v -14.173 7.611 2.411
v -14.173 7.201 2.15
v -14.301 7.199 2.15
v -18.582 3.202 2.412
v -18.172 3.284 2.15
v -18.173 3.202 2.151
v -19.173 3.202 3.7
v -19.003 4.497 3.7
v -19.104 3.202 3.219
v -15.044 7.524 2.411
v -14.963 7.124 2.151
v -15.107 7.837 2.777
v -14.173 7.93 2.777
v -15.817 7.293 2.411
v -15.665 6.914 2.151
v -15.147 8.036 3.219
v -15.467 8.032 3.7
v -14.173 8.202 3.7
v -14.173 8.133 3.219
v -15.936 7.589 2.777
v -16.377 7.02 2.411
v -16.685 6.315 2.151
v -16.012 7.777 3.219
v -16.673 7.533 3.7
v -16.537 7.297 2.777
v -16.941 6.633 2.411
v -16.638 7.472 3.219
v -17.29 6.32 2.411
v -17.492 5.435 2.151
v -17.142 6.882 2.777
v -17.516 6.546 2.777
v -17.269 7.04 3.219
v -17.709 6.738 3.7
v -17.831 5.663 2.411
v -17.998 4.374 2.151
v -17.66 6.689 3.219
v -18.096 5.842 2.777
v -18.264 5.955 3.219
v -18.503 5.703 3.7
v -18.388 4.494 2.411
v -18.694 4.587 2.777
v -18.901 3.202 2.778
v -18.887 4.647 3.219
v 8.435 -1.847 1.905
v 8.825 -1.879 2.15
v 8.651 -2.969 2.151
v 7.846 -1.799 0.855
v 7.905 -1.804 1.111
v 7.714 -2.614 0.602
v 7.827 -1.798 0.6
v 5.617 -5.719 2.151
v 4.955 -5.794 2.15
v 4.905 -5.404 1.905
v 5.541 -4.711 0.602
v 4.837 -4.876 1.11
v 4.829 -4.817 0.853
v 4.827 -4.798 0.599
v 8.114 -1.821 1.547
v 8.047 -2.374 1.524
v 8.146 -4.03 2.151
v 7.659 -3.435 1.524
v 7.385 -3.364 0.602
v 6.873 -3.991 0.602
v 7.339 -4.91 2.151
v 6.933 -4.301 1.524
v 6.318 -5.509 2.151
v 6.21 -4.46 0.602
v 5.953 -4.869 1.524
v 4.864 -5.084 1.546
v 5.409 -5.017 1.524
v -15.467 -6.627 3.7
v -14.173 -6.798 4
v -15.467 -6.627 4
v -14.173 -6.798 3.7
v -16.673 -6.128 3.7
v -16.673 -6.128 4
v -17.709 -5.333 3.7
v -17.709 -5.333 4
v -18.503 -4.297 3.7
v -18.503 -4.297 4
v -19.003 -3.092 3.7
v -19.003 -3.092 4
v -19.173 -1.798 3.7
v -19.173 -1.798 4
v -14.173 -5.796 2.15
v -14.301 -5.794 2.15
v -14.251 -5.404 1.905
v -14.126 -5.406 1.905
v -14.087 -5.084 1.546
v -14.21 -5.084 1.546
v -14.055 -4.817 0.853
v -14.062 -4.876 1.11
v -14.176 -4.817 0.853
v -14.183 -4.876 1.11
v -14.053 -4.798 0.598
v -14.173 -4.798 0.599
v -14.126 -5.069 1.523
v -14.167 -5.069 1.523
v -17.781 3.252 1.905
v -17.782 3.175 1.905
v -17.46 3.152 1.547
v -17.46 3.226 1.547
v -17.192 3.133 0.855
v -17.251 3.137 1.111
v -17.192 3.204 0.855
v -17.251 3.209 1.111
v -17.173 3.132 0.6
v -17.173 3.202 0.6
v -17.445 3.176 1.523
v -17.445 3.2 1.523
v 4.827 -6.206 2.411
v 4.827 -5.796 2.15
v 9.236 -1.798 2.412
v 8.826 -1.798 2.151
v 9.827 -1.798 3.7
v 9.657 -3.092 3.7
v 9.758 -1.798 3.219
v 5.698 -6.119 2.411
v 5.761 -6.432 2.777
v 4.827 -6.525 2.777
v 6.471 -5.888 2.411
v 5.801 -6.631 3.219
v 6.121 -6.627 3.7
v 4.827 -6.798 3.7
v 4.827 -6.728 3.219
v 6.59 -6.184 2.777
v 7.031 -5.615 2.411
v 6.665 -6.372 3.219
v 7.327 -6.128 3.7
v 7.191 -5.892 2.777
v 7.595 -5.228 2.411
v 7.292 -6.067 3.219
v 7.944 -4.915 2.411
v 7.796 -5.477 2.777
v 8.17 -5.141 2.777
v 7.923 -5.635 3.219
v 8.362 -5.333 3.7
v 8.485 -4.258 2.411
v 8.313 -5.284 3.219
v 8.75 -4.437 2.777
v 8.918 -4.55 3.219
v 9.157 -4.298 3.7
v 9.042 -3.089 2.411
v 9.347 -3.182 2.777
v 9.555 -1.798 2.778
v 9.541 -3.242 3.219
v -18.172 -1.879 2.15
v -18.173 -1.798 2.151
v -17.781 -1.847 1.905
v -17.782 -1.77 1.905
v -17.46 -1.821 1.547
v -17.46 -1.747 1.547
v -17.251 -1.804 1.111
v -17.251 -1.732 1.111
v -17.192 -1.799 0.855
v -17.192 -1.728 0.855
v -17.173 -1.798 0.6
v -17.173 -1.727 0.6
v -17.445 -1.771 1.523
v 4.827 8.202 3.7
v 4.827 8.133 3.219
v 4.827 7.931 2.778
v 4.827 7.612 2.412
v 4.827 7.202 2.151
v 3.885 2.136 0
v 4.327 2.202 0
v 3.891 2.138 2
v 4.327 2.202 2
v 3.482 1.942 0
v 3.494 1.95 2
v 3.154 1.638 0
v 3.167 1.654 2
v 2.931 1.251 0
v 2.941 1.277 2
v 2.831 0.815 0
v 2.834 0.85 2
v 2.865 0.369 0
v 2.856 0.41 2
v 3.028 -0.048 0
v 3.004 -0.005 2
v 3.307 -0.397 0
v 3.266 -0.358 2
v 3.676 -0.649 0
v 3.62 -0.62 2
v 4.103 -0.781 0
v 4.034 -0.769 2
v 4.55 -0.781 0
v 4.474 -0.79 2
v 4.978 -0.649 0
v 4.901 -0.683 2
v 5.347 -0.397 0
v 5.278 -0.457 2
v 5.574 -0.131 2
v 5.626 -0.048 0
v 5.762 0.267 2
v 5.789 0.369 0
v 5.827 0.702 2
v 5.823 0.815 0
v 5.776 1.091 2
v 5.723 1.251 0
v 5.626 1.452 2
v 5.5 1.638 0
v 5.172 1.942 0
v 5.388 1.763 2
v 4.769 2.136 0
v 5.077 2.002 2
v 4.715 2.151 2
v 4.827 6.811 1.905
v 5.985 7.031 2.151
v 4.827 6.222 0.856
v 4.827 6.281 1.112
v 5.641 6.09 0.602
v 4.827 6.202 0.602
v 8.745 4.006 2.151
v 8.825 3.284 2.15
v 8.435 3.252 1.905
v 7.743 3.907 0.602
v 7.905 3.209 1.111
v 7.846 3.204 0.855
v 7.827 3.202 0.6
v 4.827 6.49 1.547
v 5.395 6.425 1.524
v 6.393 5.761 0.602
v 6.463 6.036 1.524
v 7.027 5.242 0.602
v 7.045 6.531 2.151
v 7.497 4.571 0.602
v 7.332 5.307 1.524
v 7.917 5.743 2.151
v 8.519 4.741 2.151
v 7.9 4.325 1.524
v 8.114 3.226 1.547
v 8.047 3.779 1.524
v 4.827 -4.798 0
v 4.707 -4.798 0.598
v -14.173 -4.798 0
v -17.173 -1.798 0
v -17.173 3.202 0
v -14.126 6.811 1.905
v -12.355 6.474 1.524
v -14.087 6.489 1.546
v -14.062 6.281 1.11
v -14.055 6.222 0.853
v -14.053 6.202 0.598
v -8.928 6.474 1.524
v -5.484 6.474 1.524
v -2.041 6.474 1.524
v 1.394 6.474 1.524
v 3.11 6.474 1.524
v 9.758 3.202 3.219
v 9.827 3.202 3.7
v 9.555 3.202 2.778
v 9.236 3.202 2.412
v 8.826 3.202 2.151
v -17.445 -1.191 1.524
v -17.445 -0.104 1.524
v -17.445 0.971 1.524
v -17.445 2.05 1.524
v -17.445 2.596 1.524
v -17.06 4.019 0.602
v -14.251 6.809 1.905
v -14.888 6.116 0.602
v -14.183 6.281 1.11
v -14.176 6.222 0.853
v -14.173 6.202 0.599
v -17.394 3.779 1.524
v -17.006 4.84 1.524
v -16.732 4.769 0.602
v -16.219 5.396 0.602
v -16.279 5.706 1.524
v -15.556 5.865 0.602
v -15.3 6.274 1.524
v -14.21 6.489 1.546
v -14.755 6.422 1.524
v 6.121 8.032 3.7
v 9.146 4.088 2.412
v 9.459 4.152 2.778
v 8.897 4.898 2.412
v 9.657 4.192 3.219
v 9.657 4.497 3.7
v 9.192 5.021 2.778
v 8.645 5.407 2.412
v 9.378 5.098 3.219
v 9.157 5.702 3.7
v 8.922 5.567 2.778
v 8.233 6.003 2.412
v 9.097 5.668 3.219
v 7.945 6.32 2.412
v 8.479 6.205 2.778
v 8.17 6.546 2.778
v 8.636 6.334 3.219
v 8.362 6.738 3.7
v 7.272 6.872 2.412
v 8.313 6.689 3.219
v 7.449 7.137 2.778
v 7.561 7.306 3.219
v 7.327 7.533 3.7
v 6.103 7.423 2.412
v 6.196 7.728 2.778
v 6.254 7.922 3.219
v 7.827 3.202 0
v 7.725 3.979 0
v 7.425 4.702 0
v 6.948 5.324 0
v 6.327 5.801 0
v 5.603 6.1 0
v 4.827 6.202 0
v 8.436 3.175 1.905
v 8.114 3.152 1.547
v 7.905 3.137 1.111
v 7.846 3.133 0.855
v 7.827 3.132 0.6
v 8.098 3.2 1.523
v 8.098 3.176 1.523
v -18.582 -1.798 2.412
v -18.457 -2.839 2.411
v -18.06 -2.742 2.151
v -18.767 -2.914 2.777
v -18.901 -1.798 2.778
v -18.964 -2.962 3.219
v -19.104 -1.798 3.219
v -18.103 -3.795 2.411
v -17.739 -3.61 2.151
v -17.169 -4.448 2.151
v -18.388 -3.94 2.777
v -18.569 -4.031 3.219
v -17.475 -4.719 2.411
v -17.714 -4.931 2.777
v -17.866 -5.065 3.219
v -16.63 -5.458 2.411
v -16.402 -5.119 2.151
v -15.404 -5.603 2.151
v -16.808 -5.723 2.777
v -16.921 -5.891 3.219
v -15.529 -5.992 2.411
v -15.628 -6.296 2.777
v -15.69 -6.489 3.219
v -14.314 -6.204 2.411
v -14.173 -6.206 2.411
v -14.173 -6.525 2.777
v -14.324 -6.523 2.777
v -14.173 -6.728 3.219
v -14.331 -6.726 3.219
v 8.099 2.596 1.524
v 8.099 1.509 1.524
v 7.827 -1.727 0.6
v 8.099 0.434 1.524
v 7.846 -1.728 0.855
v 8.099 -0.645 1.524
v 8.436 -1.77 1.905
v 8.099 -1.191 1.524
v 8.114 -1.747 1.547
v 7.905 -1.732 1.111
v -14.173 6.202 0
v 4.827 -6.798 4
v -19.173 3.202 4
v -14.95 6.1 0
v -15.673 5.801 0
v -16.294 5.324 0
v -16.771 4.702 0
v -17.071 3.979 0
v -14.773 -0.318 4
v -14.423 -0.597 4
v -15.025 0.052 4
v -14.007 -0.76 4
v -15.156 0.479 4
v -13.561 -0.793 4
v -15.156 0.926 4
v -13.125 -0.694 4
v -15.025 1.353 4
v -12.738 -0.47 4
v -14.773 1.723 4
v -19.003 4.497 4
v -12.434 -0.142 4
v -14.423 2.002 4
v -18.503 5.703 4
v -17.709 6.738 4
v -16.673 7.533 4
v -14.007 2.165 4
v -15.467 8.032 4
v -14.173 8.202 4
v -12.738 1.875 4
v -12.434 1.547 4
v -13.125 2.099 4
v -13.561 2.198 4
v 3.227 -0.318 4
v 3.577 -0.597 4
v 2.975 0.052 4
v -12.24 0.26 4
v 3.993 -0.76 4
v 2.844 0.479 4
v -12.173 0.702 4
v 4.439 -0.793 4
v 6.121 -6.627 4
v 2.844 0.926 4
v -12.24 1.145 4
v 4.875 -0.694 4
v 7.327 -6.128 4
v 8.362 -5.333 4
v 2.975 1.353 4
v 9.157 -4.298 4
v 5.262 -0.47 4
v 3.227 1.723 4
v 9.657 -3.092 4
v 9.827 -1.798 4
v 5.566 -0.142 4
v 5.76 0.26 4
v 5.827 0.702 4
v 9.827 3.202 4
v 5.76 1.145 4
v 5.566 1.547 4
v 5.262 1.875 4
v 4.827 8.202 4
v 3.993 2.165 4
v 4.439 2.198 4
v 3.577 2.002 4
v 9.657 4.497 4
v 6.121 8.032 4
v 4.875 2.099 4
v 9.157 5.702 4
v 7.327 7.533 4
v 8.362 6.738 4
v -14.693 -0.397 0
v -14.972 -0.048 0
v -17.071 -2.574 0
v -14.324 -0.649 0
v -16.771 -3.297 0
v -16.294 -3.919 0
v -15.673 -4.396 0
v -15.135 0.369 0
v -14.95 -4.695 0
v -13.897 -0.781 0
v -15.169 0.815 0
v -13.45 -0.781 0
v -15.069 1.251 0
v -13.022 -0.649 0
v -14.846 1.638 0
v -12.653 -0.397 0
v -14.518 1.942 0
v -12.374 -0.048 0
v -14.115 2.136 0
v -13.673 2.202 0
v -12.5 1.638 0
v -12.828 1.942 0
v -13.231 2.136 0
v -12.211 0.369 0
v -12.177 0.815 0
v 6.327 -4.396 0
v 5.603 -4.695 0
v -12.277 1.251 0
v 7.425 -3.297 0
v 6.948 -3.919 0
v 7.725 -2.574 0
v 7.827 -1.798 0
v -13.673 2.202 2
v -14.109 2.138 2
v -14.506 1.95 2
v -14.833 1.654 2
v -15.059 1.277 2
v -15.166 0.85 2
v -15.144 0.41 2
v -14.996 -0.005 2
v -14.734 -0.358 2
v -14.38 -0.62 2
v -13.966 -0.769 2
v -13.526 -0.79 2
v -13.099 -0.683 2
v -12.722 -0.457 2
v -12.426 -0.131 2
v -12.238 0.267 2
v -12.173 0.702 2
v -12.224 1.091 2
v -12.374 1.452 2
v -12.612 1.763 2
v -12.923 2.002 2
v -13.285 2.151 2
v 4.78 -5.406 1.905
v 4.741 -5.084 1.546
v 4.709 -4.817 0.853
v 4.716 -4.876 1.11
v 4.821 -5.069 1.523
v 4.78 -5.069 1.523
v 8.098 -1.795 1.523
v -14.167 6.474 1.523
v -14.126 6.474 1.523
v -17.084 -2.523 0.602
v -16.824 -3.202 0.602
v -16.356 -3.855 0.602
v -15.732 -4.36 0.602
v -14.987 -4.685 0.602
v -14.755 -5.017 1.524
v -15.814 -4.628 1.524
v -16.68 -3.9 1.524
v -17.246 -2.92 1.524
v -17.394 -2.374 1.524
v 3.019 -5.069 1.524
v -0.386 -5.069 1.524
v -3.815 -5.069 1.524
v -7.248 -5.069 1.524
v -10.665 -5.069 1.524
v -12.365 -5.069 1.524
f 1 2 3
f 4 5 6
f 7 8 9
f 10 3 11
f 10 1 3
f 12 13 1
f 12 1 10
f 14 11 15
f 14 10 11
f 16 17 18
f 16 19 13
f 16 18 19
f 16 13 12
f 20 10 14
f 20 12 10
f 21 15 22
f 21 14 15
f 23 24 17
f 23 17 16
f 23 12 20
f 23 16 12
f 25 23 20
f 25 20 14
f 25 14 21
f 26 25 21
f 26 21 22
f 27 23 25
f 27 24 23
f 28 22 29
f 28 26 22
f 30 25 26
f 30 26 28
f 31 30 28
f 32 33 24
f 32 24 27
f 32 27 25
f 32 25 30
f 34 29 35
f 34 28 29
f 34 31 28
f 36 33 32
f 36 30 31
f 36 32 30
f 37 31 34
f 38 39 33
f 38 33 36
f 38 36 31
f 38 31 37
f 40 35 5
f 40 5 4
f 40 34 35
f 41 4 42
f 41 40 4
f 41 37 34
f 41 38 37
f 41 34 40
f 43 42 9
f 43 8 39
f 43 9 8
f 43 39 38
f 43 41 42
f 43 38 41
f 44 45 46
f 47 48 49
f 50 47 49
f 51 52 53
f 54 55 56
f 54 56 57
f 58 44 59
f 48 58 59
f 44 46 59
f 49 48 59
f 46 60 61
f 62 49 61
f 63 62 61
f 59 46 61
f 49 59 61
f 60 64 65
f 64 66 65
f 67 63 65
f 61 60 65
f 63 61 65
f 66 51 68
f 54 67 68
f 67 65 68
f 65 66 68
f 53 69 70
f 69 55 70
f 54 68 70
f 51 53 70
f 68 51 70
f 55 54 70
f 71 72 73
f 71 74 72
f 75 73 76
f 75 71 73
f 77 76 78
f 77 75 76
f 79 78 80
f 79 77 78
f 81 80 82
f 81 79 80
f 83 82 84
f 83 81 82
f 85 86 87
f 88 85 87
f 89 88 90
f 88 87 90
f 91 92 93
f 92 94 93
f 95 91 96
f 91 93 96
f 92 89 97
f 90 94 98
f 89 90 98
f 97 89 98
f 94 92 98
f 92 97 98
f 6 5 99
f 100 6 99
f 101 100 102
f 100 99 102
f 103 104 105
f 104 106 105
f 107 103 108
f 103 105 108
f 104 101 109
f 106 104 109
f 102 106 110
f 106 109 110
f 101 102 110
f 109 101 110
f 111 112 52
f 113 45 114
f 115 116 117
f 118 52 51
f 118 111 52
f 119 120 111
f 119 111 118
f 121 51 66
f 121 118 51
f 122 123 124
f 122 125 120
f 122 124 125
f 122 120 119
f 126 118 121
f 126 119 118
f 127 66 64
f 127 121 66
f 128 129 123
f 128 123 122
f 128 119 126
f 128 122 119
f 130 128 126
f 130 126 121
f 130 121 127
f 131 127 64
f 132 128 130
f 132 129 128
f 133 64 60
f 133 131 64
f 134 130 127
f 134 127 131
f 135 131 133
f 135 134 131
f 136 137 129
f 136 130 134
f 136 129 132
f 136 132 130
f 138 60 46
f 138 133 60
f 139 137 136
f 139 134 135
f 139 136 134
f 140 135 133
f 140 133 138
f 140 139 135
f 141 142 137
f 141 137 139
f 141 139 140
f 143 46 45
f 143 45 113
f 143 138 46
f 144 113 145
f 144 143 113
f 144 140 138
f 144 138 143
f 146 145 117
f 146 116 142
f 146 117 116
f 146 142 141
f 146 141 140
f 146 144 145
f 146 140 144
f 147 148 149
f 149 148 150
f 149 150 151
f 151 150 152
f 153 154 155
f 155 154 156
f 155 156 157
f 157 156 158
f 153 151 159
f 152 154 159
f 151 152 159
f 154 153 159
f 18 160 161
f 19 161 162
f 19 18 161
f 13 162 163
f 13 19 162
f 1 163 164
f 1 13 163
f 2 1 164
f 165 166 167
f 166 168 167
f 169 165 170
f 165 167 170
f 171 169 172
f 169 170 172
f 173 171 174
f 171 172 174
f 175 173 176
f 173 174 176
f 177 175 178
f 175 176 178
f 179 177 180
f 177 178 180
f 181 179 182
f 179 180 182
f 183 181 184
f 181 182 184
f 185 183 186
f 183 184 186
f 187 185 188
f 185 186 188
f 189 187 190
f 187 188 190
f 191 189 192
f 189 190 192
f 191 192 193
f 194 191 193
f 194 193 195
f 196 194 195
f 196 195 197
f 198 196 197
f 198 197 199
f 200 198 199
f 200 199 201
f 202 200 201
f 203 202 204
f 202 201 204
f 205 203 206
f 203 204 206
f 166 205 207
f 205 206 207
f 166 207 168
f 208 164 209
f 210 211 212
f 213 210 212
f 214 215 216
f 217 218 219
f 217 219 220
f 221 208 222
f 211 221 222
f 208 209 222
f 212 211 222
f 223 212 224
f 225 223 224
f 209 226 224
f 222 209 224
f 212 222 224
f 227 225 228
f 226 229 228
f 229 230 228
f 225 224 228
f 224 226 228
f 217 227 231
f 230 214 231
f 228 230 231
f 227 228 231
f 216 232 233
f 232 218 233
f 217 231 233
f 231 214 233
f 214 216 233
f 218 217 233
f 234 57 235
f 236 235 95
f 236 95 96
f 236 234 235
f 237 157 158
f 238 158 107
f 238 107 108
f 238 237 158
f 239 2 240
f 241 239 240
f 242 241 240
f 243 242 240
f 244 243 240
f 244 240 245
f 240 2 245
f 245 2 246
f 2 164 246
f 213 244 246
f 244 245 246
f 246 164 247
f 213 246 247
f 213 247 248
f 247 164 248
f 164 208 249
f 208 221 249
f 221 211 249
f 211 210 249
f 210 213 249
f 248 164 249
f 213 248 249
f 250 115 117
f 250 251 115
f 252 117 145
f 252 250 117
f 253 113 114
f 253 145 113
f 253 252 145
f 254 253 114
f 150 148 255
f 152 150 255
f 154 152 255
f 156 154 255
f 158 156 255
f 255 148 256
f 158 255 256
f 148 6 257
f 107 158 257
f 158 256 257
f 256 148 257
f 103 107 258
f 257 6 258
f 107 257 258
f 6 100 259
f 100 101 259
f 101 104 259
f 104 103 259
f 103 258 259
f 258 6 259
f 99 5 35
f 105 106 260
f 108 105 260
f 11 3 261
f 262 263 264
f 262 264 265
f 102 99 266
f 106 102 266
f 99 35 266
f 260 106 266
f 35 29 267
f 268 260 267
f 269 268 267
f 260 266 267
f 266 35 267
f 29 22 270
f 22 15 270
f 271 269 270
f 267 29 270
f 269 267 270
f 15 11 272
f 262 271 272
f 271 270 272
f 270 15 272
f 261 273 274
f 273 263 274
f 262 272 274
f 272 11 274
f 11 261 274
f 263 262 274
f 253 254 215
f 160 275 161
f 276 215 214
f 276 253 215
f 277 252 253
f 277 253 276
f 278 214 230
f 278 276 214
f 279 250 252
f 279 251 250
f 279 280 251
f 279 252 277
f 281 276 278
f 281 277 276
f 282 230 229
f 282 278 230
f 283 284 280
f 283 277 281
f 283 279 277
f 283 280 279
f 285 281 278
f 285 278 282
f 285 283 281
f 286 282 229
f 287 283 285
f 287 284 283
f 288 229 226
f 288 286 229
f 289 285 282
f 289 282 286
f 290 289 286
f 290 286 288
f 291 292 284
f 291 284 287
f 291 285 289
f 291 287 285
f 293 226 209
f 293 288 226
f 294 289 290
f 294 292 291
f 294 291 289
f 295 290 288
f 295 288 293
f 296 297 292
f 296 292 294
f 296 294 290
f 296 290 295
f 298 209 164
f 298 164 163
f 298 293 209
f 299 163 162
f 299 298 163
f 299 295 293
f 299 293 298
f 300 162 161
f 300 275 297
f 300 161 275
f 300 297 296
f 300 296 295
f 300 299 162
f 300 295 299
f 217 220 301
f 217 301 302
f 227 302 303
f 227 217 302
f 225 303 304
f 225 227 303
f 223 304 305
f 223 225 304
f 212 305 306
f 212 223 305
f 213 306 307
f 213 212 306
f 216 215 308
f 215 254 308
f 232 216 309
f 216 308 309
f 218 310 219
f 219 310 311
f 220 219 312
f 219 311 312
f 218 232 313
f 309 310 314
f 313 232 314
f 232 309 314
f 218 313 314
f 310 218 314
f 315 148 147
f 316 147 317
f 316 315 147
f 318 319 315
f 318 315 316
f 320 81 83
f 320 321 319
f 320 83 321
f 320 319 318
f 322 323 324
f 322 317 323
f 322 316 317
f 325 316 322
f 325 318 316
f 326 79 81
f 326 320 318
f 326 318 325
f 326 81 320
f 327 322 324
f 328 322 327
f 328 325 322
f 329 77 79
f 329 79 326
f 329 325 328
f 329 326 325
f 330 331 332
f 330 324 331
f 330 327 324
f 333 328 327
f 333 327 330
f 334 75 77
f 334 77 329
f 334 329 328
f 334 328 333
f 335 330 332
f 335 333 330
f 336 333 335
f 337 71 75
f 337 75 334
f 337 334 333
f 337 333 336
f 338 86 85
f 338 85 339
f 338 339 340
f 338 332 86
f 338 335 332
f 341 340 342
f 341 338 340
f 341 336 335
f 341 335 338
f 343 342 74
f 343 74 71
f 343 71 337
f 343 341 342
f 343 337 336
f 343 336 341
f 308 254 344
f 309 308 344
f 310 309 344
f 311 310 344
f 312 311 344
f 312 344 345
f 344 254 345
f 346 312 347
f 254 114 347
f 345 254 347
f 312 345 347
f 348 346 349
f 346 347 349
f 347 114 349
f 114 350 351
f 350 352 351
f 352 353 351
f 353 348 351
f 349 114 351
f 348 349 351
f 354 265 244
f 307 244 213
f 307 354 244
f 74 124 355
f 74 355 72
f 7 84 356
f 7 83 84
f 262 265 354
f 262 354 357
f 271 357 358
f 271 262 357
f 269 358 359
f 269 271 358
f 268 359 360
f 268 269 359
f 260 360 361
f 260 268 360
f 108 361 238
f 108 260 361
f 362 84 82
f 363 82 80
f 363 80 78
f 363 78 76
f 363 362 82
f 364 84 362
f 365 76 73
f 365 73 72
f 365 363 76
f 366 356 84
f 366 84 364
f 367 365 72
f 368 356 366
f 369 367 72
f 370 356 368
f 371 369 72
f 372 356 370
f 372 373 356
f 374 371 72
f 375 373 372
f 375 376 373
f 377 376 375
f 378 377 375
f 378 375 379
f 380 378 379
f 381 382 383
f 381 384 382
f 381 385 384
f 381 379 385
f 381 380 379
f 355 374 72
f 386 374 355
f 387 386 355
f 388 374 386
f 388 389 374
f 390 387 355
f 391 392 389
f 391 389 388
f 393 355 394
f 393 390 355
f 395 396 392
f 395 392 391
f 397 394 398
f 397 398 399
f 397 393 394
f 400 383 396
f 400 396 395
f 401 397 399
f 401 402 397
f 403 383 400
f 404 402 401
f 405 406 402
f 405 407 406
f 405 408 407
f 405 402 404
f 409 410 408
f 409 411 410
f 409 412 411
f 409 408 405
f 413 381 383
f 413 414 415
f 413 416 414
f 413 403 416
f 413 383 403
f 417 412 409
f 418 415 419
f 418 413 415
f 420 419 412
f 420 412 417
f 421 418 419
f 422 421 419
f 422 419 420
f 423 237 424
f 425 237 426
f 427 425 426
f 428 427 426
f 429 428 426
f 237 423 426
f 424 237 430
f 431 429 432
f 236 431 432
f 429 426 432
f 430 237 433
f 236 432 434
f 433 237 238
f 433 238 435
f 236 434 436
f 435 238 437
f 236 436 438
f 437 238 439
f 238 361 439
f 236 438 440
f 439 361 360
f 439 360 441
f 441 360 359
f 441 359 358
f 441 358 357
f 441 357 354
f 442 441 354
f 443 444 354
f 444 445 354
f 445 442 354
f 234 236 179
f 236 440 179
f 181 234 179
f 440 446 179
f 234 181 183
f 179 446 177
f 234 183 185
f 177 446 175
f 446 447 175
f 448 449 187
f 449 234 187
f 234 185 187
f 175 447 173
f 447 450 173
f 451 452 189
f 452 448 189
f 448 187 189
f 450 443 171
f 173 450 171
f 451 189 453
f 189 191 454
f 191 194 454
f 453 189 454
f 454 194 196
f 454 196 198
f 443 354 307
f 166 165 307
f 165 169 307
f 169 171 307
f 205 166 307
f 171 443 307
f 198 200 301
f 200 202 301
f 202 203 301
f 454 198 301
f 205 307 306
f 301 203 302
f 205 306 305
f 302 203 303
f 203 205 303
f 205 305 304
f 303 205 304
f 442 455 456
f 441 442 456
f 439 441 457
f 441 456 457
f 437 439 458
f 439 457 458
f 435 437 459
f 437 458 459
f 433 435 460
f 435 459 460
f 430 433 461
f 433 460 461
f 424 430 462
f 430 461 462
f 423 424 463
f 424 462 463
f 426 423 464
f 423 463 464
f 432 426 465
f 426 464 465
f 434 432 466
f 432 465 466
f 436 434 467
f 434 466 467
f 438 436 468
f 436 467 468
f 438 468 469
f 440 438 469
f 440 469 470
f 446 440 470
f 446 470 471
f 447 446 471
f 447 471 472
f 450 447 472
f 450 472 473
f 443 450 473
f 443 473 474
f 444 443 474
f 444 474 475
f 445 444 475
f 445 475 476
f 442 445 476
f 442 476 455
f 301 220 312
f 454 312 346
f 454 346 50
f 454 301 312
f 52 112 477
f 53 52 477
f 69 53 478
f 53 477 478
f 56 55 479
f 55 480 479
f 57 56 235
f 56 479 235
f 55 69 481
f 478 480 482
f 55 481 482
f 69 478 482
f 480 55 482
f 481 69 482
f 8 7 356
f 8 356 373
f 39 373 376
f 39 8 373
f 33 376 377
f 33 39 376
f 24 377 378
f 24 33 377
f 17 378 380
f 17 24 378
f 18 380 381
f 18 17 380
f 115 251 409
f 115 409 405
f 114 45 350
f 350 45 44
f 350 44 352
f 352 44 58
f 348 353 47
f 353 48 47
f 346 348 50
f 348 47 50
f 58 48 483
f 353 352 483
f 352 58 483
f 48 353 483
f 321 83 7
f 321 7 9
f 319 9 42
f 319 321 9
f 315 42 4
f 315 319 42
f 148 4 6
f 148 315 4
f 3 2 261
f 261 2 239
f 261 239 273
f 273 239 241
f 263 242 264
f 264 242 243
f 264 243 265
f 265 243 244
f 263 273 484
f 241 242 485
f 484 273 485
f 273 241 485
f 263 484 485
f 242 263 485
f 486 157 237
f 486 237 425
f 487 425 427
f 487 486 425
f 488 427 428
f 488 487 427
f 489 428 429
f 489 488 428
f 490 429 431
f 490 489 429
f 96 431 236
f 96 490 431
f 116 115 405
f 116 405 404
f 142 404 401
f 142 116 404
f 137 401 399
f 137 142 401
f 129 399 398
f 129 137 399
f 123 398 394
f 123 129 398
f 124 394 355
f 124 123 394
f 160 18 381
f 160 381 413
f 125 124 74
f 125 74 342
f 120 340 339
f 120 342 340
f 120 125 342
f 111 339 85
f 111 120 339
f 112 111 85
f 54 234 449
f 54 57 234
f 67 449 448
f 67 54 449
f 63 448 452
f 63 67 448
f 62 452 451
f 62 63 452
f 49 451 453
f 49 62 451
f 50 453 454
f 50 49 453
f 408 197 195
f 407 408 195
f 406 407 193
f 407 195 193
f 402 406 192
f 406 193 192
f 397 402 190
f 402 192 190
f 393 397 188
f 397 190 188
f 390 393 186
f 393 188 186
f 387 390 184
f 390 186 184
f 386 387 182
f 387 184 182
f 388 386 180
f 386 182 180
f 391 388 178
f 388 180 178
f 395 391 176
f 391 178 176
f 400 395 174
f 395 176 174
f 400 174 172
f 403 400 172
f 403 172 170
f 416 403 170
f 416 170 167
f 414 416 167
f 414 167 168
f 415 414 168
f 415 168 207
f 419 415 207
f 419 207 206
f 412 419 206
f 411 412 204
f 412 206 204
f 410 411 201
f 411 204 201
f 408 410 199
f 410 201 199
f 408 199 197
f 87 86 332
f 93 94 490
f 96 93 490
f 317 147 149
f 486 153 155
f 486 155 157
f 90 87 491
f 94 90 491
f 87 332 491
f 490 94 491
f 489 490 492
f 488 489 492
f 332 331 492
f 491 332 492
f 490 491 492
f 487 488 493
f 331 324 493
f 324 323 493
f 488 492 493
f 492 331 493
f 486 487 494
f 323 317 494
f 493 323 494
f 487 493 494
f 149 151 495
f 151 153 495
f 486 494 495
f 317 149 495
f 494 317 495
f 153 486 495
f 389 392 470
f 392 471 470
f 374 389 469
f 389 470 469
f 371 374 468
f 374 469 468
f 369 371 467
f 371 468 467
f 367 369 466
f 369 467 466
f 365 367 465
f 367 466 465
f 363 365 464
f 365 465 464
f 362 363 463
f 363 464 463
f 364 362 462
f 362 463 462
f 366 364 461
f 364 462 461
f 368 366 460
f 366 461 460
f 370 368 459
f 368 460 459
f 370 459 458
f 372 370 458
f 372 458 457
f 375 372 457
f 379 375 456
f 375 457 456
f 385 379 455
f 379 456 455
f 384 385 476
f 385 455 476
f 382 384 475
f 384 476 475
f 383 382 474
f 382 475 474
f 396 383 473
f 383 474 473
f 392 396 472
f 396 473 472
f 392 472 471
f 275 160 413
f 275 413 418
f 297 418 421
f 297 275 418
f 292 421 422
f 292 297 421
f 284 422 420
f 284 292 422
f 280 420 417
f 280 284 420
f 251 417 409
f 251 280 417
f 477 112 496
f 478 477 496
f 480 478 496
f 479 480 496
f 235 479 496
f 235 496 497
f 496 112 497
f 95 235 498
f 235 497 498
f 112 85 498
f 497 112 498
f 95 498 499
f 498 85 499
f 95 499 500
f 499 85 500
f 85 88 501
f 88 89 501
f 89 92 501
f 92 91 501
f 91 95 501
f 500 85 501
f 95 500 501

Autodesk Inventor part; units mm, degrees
ref_plane "YZ Plane" through (0, 0, 0) normal (1, 0, 0) x (0, 1, 0)
ref_plane "XZ Plane" through (0, 0, 0) normal (0, 1, 0) x (-1, 0, 0)
ref_plane "XY Plane" through (0, 0, 0) normal (0, 0, 1) x (1, 0, 0)
sketch "Szkic1" plane through (0, 0, 0) normal (0, 0, 1) x (1, 0, 0)
  line L0 (-17.1731, 6.2025) -> (7.8269, 6.2025)
  line L1 (7.8269, 6.2025) -> (7.8269, -4.7975)
  line L2 (7.8269, -4.7975) -> (-17.1731, -4.7975)
  line L3 (-17.1731, -4.7975) -> (-17.1731, 6.2025)
  point P0 (0, 0)
  point P1 (-13.6731, 0.7025)
  point P2 (4.3269, 0.7025)
  dimension "d0" = 25
  dimension "d1" = 11
  dimension "d2" = 5.5
  dimension "d3" = 5.5
  dimension "d4" = 3.5
  dimension "d5" = 3.5
extrude "Wyciągnięcie proste1" add sketch "Szkic1" along normal blind 2
hole "Otwór1" at (-13.6731, 0.7025, 0) at (4.3269, 0.7025, 0) direction (0, 0, 1) diameter 3 end through all
fillet "Zaokrąglenie1" radius 3 4 edges at (-17.1731, 6.2025, 1) (-17.1731, -4.7975, 1) (7.8269, 6.2025, 1) (7.8269, -4.7975, 1)
sketch "Szkic3" plane through (0, 0, 2) normal (0, 0, 1) x (1, 0, 0)
  arc A0 (4.8269, -4.7975) -> (7.8269, -1.7975) centre (4.8269, -1.7975) ccw projected
  line L0 (7.8269, -1.7975) -> (7.8269, 3.2025) projected
  arc A1 (7.8269, 3.2025) -> (4.8269, 6.2025) centre (4.8269, 3.2025) ccw projected
  line L1 (4.8269, 6.2025) -> (-14.1731, 6.2025) projected
  arc A2 (-14.1731, 6.2025) -> (-17.1731, 3.2025) centre (-14.1731, 3.2025) ccw projected
  line L2 (-17.1731, 3.2025) -> (-17.1731, -1.7975) projected
  arc A3 (-17.1731, -1.7975) -> (-14.1731, -4.7975) centre (-14.1731, -1.7975) ccw projected
  line L3 (-14.1731, -4.7975) -> (4.8269, -4.7975) projected
  circle A4 centre (-13.6731, 0.7025) radius 1.5 projected
  circle A5 centre (4.3269, 0.7025) radius 1.5 projected
  line L4 (-14.1731, 8.2025) -> (4.8269, 8.2025)
  arc A6 (9.8269, 3.2025) -> (4.8269, 8.2025) centre (4.8269, 3.2025) ccw
  line L5 (9.8269, 3.2025) -> (9.8269, -1.7975)
  arc A7 (4.8269, -6.7975) -> (9.8269, -1.7975) centre (4.8269, -1.7975) ccw
  line L6 (4.8269, -6.7975) -> (-14.1731, -6.7975)
  arc A8 (-19.1731, -1.7975) -> (-14.1731, -6.7975) centre (-14.1731, -1.7975) ccw
  line L7 (-19.1731, -1.7975) -> (-19.1731, 3.2025)
  arc A9 (-14.1731, 8.2025) -> (-19.1731, 3.2025) centre (-14.1731, 3.2025) ccw
  point P0 (0, 0)
  dimension "d16" = 2
extrude "Wyciągnięcie proste2" add sketch "Szkic3" along normal blind 2 contours L3 A3 L2 A2 L1 A1 L0 A0 | L4 A6 L5 A7 L6 A8 L7 A9
fillet "Zaokrąglenie2" radius 1.7 16 edges at (8.3624, -5.333, 2) (-4.6731, -6.7975, 2) (-17.7087, -5.333, 2) (-19.1731, 0.7025, 2) (-17.7087, 6.7381, 2) (-4.6731, 8.2025, 2) (8.3624, 6.7381, 2) (9.8269, 0.7025, 2) (6.9482, 5.3238, 2) (-4.6731, 6.2025, 2) (-16.2944, 5.3238, 2) (-17.1731, 0.7025, 2) (-16.2944, -3.9188, 2) (-4.6731, -4.7975, 2) (6.9482, -3.9188, 2) (7.8269, 0.7025, 2)
equation "\"d5\" = d4"
properties part number "3DP_ABS_Y_Axis_Belt_Mount_Spacer"
